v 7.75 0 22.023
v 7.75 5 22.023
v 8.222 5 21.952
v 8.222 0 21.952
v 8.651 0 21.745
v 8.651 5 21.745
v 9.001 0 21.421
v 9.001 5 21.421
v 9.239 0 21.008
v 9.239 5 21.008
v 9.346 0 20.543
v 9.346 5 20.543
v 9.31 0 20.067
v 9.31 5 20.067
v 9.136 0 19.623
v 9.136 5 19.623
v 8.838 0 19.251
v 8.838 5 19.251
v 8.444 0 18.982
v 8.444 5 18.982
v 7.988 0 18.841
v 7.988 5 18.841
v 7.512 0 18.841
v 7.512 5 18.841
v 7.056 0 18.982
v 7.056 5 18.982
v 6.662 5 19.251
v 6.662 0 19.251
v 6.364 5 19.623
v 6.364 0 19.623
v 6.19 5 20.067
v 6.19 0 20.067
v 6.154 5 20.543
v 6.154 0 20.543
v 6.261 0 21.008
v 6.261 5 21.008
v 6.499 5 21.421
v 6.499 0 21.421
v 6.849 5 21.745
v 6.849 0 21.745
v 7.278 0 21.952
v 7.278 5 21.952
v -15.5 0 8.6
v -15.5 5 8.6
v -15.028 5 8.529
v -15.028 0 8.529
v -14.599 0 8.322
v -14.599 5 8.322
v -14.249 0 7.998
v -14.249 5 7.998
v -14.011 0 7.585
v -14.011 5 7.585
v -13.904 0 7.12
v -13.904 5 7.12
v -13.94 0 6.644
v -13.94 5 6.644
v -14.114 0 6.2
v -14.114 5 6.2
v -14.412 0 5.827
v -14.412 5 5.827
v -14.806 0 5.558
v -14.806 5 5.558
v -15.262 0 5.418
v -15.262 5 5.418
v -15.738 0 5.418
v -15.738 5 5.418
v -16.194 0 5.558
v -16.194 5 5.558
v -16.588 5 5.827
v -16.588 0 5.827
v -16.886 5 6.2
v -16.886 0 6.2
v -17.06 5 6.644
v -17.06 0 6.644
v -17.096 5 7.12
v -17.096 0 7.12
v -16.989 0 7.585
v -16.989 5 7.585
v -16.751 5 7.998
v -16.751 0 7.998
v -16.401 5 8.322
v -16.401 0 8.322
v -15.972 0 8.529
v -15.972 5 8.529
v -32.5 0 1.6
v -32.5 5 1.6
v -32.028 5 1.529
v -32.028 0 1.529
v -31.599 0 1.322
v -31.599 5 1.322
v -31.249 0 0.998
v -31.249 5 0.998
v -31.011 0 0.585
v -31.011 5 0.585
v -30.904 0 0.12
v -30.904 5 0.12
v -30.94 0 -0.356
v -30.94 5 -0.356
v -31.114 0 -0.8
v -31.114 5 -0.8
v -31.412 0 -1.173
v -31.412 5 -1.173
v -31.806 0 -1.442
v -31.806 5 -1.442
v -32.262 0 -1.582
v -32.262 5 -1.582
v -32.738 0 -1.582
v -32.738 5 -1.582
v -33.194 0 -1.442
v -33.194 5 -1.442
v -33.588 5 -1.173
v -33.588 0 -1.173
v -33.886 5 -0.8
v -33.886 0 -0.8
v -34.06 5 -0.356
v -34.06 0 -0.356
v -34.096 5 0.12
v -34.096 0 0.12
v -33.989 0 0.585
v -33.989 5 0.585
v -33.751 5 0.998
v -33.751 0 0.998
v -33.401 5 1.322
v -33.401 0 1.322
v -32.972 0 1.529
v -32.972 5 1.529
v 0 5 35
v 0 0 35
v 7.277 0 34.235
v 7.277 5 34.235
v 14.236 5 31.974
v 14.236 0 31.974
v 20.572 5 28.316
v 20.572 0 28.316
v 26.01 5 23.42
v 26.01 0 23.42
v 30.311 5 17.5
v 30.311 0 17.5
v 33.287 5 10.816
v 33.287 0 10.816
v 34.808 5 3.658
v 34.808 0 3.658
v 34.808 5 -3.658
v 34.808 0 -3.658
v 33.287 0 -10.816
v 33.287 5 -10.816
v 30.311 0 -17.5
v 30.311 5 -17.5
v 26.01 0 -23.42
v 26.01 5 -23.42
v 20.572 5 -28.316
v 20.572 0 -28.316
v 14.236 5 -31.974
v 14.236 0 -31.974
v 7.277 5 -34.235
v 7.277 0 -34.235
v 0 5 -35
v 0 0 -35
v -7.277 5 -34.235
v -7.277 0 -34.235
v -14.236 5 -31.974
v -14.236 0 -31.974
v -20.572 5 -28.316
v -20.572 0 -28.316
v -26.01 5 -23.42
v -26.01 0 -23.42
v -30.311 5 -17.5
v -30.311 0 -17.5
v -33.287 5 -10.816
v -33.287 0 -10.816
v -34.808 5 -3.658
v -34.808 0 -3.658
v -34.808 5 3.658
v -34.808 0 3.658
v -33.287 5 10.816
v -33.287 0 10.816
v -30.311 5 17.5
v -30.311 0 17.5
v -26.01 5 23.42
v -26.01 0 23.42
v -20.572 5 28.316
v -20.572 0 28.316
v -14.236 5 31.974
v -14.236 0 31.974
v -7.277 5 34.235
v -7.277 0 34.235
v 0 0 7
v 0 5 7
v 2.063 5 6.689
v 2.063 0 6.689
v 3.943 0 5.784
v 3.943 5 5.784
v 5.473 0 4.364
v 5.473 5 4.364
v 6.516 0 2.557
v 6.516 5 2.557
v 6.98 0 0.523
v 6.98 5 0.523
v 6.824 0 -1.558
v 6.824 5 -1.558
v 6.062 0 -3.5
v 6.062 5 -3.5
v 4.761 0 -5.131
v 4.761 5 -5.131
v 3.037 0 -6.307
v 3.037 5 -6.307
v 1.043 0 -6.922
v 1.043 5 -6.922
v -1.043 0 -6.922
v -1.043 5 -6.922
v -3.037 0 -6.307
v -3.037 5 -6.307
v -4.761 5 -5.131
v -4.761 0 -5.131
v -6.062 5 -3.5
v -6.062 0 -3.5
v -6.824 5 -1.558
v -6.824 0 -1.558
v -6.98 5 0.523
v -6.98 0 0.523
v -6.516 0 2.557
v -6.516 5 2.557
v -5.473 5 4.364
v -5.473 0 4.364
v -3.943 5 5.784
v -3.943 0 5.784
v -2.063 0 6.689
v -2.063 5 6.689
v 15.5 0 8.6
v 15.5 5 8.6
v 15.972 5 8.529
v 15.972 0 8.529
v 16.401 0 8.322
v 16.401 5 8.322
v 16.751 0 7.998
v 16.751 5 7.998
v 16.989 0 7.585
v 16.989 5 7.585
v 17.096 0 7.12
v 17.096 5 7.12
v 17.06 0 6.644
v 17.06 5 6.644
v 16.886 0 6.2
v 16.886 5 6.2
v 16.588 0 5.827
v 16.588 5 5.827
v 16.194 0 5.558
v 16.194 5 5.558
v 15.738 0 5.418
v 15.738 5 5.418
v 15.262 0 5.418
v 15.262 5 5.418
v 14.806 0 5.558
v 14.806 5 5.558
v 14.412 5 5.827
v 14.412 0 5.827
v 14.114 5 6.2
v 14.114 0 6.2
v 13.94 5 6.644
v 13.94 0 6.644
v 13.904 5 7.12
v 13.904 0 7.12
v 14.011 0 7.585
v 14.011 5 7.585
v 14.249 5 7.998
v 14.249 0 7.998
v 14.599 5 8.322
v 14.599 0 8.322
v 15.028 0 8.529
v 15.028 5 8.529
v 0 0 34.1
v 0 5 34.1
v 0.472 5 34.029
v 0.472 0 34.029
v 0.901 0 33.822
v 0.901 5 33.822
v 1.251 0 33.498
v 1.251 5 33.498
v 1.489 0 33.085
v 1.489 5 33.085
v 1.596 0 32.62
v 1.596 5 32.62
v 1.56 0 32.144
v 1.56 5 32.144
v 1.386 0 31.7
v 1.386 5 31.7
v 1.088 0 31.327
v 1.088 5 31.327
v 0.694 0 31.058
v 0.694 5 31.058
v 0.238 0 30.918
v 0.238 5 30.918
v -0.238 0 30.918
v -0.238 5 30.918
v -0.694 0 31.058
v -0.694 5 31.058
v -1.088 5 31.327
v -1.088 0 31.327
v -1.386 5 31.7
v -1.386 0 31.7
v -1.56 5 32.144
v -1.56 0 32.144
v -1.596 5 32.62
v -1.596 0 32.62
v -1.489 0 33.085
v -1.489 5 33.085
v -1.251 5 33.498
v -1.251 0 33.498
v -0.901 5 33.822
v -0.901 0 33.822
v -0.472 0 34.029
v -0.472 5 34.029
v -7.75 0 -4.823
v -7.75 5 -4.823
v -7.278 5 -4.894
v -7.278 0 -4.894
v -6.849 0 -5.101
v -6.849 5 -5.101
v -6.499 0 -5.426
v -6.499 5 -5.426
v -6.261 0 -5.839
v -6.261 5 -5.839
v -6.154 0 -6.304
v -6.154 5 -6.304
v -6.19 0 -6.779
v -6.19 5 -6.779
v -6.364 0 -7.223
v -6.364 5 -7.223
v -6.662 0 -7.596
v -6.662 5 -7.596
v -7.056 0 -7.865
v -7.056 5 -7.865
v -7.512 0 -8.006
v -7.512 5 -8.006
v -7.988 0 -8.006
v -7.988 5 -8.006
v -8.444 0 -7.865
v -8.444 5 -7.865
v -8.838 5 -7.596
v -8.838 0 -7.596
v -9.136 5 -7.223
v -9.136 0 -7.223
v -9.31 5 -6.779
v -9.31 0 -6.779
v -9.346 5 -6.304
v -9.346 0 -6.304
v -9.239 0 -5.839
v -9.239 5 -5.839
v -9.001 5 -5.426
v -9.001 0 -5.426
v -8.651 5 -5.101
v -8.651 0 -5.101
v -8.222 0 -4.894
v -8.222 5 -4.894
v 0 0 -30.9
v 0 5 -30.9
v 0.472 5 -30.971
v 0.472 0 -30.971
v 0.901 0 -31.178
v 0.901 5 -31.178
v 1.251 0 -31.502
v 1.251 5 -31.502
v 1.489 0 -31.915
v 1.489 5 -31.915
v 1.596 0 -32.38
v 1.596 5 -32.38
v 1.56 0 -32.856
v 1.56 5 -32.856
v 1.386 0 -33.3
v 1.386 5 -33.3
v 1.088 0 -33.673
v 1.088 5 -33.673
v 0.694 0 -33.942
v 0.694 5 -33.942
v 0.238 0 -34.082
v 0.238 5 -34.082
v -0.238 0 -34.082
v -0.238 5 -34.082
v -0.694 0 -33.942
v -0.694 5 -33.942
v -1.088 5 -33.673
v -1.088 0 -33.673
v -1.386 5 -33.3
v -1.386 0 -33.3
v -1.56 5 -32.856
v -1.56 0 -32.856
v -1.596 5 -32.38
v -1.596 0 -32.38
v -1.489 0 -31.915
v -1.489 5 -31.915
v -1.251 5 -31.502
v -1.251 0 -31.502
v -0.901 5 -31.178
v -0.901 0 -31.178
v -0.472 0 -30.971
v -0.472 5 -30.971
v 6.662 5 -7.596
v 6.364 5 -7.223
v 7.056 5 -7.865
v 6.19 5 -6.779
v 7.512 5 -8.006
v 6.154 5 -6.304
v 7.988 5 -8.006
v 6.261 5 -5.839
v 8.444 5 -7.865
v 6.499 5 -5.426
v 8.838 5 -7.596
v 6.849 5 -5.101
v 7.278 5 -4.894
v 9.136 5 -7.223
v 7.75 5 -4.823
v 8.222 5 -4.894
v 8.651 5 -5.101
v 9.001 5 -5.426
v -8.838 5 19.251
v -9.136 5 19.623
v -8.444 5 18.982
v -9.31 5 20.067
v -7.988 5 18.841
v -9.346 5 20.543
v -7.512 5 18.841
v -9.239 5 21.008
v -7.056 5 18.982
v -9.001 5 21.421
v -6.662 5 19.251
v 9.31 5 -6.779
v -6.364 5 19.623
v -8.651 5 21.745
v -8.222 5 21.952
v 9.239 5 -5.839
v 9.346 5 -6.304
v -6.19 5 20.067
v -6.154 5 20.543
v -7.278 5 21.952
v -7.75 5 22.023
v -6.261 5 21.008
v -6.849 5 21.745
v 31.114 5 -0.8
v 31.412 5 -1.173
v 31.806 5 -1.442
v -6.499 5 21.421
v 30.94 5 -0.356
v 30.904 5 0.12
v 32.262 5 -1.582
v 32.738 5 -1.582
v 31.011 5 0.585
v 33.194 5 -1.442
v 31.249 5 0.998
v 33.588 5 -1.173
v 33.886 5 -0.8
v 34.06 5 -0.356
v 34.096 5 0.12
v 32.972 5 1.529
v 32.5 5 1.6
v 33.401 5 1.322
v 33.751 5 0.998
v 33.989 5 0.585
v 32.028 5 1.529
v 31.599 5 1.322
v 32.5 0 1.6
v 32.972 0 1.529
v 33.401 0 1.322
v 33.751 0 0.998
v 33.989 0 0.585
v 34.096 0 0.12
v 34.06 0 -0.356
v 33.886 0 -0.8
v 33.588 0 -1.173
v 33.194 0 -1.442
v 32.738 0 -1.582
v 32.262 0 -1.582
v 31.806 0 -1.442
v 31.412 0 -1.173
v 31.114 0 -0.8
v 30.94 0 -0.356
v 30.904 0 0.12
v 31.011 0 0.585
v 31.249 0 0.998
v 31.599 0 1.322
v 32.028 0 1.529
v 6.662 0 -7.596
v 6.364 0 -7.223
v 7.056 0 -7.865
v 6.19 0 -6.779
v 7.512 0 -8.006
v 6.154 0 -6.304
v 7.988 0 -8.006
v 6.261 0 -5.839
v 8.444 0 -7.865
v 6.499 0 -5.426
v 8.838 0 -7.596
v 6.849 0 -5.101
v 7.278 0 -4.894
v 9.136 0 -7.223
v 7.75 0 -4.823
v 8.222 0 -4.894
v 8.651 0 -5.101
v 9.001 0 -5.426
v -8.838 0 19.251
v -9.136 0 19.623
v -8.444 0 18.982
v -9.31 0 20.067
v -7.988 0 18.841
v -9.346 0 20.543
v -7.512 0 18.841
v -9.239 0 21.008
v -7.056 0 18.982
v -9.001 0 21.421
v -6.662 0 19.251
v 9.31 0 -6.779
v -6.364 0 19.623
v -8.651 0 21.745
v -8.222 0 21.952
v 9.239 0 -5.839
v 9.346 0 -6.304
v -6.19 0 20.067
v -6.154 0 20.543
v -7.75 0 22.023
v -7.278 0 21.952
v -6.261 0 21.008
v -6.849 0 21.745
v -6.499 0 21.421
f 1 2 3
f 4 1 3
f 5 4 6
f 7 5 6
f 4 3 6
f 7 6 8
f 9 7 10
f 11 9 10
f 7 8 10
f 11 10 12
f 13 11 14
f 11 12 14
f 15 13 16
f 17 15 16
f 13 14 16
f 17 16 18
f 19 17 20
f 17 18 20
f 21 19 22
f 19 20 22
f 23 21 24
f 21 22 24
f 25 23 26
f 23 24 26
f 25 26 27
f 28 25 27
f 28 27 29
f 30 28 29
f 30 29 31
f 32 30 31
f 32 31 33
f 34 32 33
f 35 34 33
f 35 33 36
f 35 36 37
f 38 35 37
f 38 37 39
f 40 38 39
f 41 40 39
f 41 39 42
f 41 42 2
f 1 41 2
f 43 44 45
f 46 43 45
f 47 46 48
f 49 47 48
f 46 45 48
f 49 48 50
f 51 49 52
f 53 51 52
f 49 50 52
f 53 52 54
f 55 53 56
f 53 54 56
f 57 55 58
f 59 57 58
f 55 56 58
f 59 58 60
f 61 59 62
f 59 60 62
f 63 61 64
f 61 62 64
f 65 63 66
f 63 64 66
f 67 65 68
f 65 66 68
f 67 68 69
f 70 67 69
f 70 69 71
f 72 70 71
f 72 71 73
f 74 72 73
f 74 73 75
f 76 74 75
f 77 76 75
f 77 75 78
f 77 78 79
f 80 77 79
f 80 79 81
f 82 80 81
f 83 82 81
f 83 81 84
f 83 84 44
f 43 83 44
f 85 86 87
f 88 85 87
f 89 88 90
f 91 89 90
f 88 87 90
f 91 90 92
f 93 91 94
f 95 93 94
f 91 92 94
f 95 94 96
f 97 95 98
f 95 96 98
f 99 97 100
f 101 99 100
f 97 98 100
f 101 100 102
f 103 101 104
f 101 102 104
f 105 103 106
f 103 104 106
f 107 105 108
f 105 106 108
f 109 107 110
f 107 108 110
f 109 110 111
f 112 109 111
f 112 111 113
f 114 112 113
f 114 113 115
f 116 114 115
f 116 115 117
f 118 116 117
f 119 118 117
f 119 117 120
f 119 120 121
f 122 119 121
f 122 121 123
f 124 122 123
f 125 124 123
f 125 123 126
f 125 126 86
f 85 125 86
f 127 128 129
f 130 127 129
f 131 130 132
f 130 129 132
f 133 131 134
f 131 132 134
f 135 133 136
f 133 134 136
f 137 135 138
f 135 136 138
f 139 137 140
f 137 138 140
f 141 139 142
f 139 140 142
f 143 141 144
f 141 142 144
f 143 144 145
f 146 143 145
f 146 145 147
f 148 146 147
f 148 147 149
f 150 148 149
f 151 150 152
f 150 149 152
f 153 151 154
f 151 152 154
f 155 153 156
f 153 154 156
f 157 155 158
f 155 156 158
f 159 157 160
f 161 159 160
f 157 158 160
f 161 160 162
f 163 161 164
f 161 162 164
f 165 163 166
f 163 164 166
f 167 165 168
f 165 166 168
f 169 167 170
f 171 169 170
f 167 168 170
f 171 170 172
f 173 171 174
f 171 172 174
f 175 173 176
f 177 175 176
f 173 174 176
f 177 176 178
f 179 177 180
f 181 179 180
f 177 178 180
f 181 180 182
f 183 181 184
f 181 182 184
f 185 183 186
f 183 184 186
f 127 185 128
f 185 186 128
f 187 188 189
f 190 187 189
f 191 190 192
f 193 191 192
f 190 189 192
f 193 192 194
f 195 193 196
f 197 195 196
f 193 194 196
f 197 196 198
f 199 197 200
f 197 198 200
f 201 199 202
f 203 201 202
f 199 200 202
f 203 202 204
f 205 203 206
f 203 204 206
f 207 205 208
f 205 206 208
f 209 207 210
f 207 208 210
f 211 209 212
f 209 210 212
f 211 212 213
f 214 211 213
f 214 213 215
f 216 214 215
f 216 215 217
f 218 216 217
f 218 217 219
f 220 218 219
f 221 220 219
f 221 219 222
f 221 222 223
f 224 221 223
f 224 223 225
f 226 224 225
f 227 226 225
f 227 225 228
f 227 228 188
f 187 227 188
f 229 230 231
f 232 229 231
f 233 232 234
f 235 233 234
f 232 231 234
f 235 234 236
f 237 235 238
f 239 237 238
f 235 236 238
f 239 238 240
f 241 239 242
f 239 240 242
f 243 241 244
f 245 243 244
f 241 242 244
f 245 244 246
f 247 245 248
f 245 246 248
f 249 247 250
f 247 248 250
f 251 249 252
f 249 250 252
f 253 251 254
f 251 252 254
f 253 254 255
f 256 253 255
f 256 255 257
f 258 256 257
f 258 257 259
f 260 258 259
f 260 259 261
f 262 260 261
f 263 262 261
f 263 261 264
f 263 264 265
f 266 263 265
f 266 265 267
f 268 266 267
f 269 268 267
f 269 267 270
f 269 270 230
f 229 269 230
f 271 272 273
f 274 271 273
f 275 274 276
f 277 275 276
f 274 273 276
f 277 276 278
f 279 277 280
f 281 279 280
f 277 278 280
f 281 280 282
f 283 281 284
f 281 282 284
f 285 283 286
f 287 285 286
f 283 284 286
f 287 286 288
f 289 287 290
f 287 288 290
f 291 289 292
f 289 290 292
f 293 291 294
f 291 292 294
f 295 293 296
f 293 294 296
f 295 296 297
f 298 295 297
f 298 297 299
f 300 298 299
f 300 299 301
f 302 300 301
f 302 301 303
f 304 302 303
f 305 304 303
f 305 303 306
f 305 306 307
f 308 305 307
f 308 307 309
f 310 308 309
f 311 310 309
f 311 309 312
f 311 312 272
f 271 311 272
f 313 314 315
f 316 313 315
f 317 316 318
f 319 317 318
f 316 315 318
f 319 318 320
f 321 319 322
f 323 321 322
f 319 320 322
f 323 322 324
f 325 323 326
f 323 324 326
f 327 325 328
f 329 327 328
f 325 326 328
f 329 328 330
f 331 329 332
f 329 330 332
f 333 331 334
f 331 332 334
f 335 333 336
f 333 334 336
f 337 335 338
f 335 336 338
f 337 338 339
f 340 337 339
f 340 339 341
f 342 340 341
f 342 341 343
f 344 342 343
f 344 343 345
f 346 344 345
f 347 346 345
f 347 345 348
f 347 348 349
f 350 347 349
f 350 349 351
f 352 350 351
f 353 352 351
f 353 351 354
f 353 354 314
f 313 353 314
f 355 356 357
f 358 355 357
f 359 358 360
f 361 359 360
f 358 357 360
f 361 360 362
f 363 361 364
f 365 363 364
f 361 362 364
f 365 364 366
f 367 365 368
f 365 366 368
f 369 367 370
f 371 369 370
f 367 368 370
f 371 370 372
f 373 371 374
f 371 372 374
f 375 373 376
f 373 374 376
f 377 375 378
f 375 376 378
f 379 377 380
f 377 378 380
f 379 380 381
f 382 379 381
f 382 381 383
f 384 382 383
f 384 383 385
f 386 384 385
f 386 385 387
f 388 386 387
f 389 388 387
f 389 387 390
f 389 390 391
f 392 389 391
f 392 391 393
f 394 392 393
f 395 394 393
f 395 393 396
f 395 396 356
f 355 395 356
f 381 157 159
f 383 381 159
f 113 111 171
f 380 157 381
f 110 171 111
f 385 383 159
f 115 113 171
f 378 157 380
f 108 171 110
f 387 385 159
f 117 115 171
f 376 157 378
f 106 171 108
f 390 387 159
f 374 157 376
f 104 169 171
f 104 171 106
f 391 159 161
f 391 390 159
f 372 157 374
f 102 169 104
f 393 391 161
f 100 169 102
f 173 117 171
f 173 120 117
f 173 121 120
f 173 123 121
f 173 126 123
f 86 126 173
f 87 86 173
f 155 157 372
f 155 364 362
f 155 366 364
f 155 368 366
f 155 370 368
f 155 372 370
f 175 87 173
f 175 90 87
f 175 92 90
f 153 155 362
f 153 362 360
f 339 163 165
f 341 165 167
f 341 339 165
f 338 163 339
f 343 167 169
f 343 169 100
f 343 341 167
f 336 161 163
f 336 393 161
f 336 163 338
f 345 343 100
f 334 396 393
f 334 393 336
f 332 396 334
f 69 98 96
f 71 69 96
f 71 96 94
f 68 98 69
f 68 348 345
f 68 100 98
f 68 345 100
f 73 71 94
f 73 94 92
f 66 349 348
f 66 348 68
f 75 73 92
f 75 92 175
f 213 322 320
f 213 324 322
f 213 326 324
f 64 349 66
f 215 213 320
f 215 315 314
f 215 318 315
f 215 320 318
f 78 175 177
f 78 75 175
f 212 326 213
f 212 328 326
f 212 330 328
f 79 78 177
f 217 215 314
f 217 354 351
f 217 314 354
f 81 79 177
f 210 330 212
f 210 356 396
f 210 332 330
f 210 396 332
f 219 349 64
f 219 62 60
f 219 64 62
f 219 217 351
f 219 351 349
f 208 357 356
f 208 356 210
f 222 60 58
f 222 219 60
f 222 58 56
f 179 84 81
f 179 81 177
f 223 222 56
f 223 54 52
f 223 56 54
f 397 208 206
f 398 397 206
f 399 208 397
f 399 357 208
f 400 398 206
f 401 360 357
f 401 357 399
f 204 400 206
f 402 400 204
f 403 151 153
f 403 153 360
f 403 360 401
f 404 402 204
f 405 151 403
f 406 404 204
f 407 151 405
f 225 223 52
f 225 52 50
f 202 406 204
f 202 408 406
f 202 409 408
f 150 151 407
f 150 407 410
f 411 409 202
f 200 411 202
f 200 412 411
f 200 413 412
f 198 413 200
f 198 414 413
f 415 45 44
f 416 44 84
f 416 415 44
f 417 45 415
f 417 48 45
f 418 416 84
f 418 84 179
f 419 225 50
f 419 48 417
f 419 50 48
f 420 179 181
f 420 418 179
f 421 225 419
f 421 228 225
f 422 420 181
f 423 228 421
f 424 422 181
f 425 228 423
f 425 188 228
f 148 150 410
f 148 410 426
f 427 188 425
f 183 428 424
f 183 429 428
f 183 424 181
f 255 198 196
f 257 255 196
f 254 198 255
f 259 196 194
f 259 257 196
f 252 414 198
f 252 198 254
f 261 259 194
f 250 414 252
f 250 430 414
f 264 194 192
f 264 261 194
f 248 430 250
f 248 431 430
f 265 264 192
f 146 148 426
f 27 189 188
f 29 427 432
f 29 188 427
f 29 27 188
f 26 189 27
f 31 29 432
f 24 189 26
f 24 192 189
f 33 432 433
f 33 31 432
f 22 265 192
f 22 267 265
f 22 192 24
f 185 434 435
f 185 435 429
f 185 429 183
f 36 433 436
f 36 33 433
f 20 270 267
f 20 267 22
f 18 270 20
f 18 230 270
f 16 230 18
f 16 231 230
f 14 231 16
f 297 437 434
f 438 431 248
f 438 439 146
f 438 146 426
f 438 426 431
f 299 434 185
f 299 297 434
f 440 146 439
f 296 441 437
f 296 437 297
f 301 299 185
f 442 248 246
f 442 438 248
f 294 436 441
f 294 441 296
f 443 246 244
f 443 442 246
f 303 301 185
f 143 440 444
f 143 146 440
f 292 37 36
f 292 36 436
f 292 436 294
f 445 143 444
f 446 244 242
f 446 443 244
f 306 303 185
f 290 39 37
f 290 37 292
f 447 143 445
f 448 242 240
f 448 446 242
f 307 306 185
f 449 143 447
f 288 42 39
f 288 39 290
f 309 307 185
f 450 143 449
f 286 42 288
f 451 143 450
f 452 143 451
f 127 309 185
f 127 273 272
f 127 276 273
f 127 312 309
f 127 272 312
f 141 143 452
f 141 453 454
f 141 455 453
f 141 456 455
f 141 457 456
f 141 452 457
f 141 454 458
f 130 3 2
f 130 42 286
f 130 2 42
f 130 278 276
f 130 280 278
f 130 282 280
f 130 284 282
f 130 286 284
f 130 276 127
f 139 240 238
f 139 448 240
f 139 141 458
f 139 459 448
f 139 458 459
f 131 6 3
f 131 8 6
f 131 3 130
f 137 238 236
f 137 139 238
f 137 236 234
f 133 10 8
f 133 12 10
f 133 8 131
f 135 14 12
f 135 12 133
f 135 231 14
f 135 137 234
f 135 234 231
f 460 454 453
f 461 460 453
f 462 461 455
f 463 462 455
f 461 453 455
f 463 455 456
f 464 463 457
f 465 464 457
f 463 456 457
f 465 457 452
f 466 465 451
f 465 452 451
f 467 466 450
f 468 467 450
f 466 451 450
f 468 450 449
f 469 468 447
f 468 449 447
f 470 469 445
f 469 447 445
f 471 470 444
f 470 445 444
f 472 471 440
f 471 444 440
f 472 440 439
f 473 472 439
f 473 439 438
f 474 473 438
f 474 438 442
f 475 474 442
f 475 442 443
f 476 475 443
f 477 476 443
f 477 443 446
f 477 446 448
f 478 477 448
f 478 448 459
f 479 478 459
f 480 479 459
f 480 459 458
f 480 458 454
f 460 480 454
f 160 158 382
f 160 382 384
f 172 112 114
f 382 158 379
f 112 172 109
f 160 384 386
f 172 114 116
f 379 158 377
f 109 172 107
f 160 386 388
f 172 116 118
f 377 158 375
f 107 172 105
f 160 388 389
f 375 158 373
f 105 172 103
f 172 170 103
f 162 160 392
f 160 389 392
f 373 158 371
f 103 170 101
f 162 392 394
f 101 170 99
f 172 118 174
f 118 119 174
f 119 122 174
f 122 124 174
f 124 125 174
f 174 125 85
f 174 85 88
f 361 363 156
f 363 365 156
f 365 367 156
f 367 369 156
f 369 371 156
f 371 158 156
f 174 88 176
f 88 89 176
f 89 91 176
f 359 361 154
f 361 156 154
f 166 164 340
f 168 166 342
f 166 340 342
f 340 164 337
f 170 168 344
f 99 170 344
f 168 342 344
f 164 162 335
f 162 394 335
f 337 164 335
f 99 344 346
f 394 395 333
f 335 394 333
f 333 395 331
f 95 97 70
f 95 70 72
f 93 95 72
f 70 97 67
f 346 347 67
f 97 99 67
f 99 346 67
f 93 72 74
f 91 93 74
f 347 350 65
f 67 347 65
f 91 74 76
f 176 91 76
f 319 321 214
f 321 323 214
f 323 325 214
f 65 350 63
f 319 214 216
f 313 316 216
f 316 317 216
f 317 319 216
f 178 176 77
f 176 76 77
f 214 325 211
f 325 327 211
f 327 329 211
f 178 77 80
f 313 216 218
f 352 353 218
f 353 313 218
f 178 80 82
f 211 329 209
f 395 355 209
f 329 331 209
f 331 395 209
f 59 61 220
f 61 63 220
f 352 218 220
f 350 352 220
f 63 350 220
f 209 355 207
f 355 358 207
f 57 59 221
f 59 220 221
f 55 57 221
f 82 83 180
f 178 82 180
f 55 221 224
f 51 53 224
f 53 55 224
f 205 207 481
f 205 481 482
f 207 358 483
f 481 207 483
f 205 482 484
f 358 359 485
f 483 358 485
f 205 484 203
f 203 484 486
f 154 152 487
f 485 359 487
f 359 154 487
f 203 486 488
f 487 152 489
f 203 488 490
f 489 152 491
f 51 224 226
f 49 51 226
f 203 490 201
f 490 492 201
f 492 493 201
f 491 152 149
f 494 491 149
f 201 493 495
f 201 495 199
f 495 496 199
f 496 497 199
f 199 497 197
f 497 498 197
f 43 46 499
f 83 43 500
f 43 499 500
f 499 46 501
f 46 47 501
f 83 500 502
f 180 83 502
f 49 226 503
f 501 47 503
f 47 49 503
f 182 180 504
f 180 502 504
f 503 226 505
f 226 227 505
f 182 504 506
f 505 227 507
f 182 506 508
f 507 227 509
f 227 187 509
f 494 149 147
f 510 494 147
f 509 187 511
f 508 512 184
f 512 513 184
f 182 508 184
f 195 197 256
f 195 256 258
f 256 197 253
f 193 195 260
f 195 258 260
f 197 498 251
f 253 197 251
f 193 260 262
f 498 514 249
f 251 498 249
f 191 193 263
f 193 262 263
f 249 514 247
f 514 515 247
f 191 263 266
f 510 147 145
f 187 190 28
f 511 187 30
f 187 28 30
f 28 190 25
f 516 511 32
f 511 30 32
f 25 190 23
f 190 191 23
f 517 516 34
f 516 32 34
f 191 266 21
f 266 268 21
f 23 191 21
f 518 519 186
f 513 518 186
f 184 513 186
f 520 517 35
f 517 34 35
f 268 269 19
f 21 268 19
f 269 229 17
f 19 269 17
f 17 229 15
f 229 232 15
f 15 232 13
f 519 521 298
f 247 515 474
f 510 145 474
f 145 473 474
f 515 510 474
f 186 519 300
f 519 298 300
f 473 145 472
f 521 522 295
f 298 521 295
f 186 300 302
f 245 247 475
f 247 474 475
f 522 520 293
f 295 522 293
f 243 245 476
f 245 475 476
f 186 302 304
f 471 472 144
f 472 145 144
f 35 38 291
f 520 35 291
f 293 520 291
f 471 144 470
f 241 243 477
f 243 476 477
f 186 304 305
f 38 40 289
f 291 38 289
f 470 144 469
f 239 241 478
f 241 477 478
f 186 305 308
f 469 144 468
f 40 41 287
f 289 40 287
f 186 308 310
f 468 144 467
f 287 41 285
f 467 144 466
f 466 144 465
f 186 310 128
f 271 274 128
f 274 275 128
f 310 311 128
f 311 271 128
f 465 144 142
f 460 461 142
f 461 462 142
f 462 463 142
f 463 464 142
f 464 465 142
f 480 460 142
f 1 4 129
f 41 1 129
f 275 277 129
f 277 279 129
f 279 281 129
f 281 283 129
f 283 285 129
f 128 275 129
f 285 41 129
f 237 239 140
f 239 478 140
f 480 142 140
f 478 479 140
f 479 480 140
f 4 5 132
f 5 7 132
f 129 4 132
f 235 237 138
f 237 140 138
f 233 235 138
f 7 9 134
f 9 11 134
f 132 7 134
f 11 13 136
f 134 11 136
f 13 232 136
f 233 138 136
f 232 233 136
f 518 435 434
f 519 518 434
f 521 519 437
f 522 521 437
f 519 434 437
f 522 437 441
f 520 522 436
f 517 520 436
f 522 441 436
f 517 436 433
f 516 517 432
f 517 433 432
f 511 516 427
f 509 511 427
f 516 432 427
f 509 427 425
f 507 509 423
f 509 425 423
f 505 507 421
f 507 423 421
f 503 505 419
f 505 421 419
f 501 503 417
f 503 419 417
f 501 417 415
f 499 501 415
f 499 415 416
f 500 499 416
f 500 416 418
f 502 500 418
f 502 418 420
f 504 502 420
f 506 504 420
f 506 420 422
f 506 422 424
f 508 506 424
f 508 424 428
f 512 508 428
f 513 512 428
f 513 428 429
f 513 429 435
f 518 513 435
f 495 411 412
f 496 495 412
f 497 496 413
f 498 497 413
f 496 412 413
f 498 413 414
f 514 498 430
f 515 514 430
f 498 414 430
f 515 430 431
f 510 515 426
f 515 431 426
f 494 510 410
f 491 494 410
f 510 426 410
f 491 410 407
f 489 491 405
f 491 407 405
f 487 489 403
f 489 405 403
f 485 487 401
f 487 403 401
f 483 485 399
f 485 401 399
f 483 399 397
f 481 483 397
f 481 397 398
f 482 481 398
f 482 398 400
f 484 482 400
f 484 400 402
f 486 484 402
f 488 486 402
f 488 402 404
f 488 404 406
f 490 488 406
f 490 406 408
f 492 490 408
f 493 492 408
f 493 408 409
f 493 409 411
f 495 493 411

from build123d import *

# Parameters (mm, degrees)
SKETCH_1_R          = 35
EXTRUDE_1_DEPTH     = 5
SKETCH_3_R          = 1.6
CUT_EXTRUDE_1_DEPTH = 50.749371855
SKETCH_4_R          = 7
SKETCH_4_R_2        = 1.6
CUT_EXTRUDE_2_DEPTH = 50.749371855


with BuildPart() as part:
    # ｽｹｯﾁ1 → ﾎﾞｽ - 押し出し1 (new body)
    with BuildSketch(Plane(origin=(0, 0, 0), x_dir=(1, 0, 0), z_dir=(0, 1, 0))):
        with Locations(Location((0, 0, 0), (0, 0, 270))):
            Circle(SKETCH_1_R)
    extrude(amount=EXTRUDE_1_DEPTH)

    # ｽｹｯﾁ3 → ｶｯﾄ - 押し出し1 (cut, through all)
    with BuildSketch(Plane(origin=(0, 5, 0), x_dir=(1, 0, 0), z_dir=(0, 1, 0))):
        with Locations(Location((-32.5, 0, 0), (0, 0, 270))):
            Circle(SKETCH_3_R)
        with Locations(Location((0, 32.5, 0), (0, 0, 270))):
            Circle(SKETCH_3_R)
        with Locations(Location((32.5, 0, 0), (0, 0, 270))):
            Circle(SKETCH_3_R)
        with Locations(Location((0, -32.5, 0), (0, 0, 270))):
            Circle(SKETCH_3_R)
    extrude(amount=-CUT_EXTRUDE_1_DEPTH, mode=Mode.SUBTRACT)

    # ｽｹｯﾁ4 → ｶｯﾄ - 押し出し2 (cut, through all)
    with BuildSketch(Plane(origin=(0, 5, 0), x_dir=(1, 0, 0), z_dir=(0, 1, 0))):
        with Locations(Location((0, 0, 0), (0, 0, 270))):
            Circle(SKETCH_4_R)
        with Locations(Location((-15.5, -7, 0), (0, 0, 270))):
            Circle(SKETCH_4_R_2)
        with Locations(Location((-7.75, 6.423393759, 0), (0, 0, 270))):
            Circle(SKETCH_4_R_2)
        with Locations(Location((7.75, 6.423393759, 0), (0, 0, 270))):
            Circle(SKETCH_4_R_2)
        with Locations(Location((15.5, -7, 0), (0, 0, 270))):
            Circle(SKETCH_4_R_2)
        with Locations(Location((7.75, -20.423393759, 0), (0, 0, 270))):
            Circle(SKETCH_4_R_2)
        with Locations(Location((-7.75, -20.423393759, 0), (0, 0, 270))):
            Circle(SKETCH_4_R_2)
    extrude(amount=-CUT_EXTRUDE_2_DEPTH, mode=Mode.SUBTRACT)


solid = part.part
